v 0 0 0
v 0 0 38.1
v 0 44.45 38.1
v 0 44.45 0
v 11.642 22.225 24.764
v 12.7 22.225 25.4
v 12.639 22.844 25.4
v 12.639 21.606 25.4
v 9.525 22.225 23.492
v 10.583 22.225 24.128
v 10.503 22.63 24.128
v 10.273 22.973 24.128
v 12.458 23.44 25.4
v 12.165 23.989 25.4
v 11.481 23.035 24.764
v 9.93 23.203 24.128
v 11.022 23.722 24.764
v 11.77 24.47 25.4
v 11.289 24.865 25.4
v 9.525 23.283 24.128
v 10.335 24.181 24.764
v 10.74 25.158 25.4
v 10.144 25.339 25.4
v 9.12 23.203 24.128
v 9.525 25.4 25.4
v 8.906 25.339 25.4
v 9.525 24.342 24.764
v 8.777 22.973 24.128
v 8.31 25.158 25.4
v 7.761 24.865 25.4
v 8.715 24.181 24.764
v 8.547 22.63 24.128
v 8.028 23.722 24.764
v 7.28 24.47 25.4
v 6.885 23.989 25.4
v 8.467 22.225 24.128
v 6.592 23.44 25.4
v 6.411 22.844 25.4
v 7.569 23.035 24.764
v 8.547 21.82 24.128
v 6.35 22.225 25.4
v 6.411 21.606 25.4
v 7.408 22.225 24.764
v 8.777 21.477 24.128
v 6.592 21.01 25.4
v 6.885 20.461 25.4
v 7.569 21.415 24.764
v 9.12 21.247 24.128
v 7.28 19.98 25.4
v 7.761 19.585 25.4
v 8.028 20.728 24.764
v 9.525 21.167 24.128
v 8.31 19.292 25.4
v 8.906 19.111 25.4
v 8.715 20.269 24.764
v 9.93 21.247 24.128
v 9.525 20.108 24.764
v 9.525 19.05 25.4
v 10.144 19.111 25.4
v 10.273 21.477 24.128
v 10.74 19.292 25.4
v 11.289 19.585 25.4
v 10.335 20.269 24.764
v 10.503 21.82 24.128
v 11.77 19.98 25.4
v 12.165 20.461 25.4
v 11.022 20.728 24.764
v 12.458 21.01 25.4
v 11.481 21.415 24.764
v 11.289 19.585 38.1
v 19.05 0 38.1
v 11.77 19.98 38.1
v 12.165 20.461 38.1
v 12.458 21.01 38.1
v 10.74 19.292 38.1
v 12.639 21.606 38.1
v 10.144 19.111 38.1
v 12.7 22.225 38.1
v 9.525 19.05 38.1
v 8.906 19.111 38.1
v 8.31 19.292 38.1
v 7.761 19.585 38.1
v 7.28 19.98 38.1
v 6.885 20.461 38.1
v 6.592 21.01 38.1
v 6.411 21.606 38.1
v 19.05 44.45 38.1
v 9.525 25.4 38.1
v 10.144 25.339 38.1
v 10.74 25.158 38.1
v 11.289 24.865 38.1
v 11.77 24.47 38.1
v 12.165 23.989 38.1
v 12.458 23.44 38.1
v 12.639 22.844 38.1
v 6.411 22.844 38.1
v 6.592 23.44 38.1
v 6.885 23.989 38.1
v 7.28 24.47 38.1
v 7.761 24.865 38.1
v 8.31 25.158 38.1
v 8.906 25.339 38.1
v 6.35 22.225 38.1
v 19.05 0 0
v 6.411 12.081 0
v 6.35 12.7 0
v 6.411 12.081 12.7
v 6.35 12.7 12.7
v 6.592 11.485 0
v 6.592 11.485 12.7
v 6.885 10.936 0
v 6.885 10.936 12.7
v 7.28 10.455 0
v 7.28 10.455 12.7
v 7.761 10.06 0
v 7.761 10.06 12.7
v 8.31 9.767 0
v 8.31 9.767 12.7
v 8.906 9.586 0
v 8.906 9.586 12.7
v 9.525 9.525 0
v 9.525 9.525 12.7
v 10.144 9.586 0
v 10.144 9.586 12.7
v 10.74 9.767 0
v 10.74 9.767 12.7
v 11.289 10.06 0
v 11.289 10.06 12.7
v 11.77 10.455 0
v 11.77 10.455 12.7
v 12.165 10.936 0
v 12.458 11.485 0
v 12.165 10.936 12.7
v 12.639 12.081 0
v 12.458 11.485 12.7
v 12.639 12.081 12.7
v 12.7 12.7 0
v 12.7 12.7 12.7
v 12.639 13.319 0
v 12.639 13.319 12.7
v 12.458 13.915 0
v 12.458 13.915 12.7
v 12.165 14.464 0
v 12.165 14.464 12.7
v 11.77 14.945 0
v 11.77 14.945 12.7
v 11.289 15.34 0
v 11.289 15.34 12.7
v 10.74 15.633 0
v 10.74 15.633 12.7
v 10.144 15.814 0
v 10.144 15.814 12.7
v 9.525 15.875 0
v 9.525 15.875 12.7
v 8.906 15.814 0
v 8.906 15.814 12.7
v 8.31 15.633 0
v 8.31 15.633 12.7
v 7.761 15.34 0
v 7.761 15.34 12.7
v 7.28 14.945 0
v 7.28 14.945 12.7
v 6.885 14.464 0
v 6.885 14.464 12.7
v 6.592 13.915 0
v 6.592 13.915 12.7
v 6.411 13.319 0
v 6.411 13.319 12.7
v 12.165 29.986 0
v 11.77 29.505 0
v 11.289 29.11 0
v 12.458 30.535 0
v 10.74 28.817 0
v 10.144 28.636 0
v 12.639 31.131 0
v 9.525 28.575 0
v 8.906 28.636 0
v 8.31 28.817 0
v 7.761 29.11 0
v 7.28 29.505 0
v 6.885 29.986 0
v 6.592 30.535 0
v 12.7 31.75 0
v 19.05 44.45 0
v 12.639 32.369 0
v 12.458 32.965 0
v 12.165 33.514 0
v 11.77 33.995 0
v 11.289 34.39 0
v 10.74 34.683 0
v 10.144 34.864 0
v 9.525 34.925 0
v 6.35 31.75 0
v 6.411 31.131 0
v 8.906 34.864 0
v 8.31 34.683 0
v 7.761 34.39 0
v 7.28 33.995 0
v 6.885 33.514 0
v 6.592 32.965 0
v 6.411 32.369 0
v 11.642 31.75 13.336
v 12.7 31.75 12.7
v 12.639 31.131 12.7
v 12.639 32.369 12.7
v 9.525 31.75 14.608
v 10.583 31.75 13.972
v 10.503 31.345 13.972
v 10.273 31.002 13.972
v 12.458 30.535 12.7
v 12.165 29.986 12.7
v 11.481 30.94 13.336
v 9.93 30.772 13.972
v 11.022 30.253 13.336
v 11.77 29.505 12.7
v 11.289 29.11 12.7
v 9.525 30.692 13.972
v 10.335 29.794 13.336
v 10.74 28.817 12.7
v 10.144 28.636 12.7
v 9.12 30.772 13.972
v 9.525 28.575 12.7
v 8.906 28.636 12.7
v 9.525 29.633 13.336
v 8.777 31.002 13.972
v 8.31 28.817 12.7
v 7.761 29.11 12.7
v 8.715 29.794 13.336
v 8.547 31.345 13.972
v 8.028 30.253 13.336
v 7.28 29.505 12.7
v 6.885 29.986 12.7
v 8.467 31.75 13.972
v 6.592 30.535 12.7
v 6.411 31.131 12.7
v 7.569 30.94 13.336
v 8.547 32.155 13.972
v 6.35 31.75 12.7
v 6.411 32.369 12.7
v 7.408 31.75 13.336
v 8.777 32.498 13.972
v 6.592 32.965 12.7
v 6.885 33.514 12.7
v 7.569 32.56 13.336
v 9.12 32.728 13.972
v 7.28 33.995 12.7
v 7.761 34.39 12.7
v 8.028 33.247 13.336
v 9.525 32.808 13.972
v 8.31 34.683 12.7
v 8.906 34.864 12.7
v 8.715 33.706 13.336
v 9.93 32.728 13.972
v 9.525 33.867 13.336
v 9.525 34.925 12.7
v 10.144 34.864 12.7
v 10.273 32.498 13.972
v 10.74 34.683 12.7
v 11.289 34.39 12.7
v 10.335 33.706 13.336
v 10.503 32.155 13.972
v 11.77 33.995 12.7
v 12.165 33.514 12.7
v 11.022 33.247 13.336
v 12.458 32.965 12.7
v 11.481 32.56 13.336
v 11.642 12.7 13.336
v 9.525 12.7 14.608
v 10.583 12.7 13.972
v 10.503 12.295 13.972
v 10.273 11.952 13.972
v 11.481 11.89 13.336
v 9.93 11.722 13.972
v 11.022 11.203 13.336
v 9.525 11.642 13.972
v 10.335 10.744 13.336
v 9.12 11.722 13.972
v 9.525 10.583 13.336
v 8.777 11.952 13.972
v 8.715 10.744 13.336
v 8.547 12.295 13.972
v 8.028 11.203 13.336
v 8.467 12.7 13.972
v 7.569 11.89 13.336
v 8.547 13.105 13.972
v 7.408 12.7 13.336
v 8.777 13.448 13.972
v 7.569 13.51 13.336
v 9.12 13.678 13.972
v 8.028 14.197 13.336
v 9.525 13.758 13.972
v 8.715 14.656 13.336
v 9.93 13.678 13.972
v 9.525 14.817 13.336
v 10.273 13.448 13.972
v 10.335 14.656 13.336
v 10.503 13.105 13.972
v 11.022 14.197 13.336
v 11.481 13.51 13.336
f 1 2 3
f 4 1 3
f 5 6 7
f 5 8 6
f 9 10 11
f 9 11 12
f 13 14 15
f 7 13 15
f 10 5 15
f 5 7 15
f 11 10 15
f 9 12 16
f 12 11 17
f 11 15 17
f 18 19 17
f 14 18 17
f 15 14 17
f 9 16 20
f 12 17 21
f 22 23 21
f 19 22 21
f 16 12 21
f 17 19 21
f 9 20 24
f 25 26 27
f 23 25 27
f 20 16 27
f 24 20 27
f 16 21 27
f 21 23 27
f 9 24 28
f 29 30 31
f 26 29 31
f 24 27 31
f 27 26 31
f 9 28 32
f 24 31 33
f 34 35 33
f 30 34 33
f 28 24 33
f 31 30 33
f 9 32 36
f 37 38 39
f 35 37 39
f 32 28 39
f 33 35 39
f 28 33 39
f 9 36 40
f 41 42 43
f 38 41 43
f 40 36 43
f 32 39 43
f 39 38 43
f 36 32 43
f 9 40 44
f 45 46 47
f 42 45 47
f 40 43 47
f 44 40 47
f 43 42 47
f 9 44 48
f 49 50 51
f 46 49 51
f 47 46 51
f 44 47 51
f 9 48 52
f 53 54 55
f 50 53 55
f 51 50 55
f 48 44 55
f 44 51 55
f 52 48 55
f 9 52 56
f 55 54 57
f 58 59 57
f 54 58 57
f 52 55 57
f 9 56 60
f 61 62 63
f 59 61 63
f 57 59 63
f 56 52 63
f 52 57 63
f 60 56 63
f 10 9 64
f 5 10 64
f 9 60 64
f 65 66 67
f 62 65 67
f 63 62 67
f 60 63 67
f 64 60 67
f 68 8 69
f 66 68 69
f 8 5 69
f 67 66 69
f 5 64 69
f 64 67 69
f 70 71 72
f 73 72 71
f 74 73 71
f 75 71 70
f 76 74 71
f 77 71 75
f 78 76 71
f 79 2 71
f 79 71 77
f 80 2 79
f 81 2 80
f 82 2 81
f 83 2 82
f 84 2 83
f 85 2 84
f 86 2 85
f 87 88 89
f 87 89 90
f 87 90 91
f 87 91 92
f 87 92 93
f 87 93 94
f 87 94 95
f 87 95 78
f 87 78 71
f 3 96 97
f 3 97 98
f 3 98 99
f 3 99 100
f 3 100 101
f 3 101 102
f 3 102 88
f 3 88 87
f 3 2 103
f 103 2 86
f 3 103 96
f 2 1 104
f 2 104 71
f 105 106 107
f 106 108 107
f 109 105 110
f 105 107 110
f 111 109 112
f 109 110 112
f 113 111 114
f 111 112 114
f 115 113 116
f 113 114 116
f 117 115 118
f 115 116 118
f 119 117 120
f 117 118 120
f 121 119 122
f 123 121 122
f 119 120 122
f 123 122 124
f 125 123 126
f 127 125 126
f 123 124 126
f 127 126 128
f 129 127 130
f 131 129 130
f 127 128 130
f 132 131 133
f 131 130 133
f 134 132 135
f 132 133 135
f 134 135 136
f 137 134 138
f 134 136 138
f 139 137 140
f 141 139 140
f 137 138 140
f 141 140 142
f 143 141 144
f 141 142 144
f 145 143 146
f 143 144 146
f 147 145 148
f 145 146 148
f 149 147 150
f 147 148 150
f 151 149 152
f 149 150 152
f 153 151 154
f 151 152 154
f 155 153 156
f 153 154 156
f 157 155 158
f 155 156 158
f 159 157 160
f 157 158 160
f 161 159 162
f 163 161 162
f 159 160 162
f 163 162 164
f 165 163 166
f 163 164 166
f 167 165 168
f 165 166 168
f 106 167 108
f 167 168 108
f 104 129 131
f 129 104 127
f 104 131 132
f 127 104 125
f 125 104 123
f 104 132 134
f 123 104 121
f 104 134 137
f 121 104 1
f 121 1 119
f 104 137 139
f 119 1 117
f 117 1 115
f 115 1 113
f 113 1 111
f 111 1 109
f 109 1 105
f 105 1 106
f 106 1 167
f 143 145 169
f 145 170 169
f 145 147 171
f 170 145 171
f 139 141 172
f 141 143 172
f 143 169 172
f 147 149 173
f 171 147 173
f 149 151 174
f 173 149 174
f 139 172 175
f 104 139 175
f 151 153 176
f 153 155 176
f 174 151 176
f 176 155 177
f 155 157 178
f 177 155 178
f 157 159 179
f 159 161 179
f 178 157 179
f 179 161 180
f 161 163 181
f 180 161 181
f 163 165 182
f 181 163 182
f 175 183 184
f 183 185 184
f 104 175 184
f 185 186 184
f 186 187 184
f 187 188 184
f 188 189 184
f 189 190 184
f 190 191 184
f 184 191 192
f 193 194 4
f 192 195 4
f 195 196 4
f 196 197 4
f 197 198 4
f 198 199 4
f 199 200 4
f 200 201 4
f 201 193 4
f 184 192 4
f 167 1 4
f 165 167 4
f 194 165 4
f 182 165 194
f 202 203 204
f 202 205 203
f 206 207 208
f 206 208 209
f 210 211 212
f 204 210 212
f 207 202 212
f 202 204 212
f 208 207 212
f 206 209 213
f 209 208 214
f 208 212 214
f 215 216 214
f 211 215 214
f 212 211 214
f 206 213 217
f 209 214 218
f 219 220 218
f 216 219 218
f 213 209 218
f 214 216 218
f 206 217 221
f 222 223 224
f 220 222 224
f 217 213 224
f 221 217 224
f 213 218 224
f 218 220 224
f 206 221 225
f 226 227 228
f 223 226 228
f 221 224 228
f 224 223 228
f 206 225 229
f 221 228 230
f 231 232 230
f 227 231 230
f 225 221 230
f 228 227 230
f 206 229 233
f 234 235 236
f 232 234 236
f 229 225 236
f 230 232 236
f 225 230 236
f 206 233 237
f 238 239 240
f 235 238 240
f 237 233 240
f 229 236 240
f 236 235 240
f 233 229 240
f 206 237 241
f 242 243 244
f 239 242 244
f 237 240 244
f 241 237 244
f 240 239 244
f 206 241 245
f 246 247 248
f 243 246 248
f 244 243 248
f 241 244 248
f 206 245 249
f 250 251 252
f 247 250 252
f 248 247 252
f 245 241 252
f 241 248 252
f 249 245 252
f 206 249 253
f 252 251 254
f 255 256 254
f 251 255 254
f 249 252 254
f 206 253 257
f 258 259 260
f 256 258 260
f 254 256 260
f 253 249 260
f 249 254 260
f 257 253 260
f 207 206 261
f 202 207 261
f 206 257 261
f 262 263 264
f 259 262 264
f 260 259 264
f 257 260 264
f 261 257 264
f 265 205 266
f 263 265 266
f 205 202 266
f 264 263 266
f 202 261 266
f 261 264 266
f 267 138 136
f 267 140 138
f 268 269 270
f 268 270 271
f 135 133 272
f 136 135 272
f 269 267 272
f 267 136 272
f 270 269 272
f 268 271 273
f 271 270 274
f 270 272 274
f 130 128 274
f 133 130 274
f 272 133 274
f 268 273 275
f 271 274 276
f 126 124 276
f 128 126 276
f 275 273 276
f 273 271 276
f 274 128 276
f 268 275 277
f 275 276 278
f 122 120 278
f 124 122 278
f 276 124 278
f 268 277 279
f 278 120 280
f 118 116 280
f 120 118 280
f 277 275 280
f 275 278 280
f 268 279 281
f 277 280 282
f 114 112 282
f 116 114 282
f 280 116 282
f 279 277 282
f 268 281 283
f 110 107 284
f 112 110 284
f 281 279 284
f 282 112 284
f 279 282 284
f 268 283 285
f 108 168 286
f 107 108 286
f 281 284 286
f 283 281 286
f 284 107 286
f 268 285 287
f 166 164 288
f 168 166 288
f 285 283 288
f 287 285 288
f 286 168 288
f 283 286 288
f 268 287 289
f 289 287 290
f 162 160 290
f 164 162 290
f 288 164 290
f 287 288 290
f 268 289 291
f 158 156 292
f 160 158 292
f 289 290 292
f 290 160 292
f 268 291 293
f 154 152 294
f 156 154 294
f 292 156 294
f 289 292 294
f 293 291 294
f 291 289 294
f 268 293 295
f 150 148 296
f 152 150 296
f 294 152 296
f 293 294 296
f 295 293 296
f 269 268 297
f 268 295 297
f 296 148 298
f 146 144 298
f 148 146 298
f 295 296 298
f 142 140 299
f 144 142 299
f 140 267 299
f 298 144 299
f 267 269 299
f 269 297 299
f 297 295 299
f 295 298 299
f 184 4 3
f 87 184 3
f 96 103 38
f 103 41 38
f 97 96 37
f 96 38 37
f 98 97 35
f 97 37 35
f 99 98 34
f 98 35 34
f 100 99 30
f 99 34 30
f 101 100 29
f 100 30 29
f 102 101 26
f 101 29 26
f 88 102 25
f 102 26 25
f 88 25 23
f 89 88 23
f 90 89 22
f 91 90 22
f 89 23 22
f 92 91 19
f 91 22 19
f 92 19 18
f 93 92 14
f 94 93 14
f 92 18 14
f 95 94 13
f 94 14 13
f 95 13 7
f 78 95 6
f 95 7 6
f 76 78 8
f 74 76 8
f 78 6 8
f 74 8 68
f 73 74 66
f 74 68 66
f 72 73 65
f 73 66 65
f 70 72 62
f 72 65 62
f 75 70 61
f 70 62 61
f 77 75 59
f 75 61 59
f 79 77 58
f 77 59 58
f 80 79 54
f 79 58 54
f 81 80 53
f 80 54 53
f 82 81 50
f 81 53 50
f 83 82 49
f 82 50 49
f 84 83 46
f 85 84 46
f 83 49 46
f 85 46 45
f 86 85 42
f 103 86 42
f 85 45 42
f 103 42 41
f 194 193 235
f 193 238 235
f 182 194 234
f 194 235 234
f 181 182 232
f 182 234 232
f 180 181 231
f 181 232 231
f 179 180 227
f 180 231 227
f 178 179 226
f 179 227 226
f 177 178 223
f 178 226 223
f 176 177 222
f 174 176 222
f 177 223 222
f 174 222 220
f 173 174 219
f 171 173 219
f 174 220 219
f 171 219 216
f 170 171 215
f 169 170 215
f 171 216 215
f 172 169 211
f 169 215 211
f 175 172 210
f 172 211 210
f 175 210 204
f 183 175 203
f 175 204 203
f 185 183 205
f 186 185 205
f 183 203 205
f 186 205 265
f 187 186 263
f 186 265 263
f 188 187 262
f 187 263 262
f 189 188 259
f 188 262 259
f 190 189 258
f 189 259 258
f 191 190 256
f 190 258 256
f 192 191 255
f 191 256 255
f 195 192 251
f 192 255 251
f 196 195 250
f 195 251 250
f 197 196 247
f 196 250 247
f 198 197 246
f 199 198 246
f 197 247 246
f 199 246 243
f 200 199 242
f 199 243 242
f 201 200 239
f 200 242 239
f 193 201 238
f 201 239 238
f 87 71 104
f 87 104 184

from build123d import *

# Parameters (mm, degrees)
F0_W     = 44.45
F0_H     = 38.1
F1_DEPTH = 19.05
F3_D     = 6.35
F3_DEPTH = 12.7
F3_TIP   = 1.9077324654
F5_D     = 6.35
F5_DEPTH = 12.7
F5_TIP   = 1.9077324654


with BuildPart() as f1:
    # F0 (on Right) → F1 (new body)
    with BuildSketch(Plane.YZ):
        with Locations((22.225, 19.05)):
            Rectangle(F0_W, F0_H)
    extrude(amount=F1_DEPTH)

    # F3
    with Locations(Plane.XY.offset(38.1)):
        with Locations((9.525, 22.225)):
            Hole(F3_D / 2, depth=F3_DEPTH)
            with Locations((0, 0, -(F3_DEPTH + F3_TIP / 2))):  # 118° drill point
                Cone(0, F3_D / 2, F3_TIP, mode=Mode.SUBTRACT)

    # F5
    with Locations(Plane(origin=(0, 0, 0), x_dir=(1, 0, 0), z_dir=(0, 0, -1))):
        with Locations((9.525, -12.7), (9.525, -31.75)):
            Hole(F5_D / 2, depth=F5_DEPTH)
            with Locations((0, 0, -(F5_DEPTH + F5_TIP / 2))):  # 118° drill point
                Cone(0, F5_D / 2, F5_TIP, mode=Mode.SUBTRACT)


solid = f1.part
